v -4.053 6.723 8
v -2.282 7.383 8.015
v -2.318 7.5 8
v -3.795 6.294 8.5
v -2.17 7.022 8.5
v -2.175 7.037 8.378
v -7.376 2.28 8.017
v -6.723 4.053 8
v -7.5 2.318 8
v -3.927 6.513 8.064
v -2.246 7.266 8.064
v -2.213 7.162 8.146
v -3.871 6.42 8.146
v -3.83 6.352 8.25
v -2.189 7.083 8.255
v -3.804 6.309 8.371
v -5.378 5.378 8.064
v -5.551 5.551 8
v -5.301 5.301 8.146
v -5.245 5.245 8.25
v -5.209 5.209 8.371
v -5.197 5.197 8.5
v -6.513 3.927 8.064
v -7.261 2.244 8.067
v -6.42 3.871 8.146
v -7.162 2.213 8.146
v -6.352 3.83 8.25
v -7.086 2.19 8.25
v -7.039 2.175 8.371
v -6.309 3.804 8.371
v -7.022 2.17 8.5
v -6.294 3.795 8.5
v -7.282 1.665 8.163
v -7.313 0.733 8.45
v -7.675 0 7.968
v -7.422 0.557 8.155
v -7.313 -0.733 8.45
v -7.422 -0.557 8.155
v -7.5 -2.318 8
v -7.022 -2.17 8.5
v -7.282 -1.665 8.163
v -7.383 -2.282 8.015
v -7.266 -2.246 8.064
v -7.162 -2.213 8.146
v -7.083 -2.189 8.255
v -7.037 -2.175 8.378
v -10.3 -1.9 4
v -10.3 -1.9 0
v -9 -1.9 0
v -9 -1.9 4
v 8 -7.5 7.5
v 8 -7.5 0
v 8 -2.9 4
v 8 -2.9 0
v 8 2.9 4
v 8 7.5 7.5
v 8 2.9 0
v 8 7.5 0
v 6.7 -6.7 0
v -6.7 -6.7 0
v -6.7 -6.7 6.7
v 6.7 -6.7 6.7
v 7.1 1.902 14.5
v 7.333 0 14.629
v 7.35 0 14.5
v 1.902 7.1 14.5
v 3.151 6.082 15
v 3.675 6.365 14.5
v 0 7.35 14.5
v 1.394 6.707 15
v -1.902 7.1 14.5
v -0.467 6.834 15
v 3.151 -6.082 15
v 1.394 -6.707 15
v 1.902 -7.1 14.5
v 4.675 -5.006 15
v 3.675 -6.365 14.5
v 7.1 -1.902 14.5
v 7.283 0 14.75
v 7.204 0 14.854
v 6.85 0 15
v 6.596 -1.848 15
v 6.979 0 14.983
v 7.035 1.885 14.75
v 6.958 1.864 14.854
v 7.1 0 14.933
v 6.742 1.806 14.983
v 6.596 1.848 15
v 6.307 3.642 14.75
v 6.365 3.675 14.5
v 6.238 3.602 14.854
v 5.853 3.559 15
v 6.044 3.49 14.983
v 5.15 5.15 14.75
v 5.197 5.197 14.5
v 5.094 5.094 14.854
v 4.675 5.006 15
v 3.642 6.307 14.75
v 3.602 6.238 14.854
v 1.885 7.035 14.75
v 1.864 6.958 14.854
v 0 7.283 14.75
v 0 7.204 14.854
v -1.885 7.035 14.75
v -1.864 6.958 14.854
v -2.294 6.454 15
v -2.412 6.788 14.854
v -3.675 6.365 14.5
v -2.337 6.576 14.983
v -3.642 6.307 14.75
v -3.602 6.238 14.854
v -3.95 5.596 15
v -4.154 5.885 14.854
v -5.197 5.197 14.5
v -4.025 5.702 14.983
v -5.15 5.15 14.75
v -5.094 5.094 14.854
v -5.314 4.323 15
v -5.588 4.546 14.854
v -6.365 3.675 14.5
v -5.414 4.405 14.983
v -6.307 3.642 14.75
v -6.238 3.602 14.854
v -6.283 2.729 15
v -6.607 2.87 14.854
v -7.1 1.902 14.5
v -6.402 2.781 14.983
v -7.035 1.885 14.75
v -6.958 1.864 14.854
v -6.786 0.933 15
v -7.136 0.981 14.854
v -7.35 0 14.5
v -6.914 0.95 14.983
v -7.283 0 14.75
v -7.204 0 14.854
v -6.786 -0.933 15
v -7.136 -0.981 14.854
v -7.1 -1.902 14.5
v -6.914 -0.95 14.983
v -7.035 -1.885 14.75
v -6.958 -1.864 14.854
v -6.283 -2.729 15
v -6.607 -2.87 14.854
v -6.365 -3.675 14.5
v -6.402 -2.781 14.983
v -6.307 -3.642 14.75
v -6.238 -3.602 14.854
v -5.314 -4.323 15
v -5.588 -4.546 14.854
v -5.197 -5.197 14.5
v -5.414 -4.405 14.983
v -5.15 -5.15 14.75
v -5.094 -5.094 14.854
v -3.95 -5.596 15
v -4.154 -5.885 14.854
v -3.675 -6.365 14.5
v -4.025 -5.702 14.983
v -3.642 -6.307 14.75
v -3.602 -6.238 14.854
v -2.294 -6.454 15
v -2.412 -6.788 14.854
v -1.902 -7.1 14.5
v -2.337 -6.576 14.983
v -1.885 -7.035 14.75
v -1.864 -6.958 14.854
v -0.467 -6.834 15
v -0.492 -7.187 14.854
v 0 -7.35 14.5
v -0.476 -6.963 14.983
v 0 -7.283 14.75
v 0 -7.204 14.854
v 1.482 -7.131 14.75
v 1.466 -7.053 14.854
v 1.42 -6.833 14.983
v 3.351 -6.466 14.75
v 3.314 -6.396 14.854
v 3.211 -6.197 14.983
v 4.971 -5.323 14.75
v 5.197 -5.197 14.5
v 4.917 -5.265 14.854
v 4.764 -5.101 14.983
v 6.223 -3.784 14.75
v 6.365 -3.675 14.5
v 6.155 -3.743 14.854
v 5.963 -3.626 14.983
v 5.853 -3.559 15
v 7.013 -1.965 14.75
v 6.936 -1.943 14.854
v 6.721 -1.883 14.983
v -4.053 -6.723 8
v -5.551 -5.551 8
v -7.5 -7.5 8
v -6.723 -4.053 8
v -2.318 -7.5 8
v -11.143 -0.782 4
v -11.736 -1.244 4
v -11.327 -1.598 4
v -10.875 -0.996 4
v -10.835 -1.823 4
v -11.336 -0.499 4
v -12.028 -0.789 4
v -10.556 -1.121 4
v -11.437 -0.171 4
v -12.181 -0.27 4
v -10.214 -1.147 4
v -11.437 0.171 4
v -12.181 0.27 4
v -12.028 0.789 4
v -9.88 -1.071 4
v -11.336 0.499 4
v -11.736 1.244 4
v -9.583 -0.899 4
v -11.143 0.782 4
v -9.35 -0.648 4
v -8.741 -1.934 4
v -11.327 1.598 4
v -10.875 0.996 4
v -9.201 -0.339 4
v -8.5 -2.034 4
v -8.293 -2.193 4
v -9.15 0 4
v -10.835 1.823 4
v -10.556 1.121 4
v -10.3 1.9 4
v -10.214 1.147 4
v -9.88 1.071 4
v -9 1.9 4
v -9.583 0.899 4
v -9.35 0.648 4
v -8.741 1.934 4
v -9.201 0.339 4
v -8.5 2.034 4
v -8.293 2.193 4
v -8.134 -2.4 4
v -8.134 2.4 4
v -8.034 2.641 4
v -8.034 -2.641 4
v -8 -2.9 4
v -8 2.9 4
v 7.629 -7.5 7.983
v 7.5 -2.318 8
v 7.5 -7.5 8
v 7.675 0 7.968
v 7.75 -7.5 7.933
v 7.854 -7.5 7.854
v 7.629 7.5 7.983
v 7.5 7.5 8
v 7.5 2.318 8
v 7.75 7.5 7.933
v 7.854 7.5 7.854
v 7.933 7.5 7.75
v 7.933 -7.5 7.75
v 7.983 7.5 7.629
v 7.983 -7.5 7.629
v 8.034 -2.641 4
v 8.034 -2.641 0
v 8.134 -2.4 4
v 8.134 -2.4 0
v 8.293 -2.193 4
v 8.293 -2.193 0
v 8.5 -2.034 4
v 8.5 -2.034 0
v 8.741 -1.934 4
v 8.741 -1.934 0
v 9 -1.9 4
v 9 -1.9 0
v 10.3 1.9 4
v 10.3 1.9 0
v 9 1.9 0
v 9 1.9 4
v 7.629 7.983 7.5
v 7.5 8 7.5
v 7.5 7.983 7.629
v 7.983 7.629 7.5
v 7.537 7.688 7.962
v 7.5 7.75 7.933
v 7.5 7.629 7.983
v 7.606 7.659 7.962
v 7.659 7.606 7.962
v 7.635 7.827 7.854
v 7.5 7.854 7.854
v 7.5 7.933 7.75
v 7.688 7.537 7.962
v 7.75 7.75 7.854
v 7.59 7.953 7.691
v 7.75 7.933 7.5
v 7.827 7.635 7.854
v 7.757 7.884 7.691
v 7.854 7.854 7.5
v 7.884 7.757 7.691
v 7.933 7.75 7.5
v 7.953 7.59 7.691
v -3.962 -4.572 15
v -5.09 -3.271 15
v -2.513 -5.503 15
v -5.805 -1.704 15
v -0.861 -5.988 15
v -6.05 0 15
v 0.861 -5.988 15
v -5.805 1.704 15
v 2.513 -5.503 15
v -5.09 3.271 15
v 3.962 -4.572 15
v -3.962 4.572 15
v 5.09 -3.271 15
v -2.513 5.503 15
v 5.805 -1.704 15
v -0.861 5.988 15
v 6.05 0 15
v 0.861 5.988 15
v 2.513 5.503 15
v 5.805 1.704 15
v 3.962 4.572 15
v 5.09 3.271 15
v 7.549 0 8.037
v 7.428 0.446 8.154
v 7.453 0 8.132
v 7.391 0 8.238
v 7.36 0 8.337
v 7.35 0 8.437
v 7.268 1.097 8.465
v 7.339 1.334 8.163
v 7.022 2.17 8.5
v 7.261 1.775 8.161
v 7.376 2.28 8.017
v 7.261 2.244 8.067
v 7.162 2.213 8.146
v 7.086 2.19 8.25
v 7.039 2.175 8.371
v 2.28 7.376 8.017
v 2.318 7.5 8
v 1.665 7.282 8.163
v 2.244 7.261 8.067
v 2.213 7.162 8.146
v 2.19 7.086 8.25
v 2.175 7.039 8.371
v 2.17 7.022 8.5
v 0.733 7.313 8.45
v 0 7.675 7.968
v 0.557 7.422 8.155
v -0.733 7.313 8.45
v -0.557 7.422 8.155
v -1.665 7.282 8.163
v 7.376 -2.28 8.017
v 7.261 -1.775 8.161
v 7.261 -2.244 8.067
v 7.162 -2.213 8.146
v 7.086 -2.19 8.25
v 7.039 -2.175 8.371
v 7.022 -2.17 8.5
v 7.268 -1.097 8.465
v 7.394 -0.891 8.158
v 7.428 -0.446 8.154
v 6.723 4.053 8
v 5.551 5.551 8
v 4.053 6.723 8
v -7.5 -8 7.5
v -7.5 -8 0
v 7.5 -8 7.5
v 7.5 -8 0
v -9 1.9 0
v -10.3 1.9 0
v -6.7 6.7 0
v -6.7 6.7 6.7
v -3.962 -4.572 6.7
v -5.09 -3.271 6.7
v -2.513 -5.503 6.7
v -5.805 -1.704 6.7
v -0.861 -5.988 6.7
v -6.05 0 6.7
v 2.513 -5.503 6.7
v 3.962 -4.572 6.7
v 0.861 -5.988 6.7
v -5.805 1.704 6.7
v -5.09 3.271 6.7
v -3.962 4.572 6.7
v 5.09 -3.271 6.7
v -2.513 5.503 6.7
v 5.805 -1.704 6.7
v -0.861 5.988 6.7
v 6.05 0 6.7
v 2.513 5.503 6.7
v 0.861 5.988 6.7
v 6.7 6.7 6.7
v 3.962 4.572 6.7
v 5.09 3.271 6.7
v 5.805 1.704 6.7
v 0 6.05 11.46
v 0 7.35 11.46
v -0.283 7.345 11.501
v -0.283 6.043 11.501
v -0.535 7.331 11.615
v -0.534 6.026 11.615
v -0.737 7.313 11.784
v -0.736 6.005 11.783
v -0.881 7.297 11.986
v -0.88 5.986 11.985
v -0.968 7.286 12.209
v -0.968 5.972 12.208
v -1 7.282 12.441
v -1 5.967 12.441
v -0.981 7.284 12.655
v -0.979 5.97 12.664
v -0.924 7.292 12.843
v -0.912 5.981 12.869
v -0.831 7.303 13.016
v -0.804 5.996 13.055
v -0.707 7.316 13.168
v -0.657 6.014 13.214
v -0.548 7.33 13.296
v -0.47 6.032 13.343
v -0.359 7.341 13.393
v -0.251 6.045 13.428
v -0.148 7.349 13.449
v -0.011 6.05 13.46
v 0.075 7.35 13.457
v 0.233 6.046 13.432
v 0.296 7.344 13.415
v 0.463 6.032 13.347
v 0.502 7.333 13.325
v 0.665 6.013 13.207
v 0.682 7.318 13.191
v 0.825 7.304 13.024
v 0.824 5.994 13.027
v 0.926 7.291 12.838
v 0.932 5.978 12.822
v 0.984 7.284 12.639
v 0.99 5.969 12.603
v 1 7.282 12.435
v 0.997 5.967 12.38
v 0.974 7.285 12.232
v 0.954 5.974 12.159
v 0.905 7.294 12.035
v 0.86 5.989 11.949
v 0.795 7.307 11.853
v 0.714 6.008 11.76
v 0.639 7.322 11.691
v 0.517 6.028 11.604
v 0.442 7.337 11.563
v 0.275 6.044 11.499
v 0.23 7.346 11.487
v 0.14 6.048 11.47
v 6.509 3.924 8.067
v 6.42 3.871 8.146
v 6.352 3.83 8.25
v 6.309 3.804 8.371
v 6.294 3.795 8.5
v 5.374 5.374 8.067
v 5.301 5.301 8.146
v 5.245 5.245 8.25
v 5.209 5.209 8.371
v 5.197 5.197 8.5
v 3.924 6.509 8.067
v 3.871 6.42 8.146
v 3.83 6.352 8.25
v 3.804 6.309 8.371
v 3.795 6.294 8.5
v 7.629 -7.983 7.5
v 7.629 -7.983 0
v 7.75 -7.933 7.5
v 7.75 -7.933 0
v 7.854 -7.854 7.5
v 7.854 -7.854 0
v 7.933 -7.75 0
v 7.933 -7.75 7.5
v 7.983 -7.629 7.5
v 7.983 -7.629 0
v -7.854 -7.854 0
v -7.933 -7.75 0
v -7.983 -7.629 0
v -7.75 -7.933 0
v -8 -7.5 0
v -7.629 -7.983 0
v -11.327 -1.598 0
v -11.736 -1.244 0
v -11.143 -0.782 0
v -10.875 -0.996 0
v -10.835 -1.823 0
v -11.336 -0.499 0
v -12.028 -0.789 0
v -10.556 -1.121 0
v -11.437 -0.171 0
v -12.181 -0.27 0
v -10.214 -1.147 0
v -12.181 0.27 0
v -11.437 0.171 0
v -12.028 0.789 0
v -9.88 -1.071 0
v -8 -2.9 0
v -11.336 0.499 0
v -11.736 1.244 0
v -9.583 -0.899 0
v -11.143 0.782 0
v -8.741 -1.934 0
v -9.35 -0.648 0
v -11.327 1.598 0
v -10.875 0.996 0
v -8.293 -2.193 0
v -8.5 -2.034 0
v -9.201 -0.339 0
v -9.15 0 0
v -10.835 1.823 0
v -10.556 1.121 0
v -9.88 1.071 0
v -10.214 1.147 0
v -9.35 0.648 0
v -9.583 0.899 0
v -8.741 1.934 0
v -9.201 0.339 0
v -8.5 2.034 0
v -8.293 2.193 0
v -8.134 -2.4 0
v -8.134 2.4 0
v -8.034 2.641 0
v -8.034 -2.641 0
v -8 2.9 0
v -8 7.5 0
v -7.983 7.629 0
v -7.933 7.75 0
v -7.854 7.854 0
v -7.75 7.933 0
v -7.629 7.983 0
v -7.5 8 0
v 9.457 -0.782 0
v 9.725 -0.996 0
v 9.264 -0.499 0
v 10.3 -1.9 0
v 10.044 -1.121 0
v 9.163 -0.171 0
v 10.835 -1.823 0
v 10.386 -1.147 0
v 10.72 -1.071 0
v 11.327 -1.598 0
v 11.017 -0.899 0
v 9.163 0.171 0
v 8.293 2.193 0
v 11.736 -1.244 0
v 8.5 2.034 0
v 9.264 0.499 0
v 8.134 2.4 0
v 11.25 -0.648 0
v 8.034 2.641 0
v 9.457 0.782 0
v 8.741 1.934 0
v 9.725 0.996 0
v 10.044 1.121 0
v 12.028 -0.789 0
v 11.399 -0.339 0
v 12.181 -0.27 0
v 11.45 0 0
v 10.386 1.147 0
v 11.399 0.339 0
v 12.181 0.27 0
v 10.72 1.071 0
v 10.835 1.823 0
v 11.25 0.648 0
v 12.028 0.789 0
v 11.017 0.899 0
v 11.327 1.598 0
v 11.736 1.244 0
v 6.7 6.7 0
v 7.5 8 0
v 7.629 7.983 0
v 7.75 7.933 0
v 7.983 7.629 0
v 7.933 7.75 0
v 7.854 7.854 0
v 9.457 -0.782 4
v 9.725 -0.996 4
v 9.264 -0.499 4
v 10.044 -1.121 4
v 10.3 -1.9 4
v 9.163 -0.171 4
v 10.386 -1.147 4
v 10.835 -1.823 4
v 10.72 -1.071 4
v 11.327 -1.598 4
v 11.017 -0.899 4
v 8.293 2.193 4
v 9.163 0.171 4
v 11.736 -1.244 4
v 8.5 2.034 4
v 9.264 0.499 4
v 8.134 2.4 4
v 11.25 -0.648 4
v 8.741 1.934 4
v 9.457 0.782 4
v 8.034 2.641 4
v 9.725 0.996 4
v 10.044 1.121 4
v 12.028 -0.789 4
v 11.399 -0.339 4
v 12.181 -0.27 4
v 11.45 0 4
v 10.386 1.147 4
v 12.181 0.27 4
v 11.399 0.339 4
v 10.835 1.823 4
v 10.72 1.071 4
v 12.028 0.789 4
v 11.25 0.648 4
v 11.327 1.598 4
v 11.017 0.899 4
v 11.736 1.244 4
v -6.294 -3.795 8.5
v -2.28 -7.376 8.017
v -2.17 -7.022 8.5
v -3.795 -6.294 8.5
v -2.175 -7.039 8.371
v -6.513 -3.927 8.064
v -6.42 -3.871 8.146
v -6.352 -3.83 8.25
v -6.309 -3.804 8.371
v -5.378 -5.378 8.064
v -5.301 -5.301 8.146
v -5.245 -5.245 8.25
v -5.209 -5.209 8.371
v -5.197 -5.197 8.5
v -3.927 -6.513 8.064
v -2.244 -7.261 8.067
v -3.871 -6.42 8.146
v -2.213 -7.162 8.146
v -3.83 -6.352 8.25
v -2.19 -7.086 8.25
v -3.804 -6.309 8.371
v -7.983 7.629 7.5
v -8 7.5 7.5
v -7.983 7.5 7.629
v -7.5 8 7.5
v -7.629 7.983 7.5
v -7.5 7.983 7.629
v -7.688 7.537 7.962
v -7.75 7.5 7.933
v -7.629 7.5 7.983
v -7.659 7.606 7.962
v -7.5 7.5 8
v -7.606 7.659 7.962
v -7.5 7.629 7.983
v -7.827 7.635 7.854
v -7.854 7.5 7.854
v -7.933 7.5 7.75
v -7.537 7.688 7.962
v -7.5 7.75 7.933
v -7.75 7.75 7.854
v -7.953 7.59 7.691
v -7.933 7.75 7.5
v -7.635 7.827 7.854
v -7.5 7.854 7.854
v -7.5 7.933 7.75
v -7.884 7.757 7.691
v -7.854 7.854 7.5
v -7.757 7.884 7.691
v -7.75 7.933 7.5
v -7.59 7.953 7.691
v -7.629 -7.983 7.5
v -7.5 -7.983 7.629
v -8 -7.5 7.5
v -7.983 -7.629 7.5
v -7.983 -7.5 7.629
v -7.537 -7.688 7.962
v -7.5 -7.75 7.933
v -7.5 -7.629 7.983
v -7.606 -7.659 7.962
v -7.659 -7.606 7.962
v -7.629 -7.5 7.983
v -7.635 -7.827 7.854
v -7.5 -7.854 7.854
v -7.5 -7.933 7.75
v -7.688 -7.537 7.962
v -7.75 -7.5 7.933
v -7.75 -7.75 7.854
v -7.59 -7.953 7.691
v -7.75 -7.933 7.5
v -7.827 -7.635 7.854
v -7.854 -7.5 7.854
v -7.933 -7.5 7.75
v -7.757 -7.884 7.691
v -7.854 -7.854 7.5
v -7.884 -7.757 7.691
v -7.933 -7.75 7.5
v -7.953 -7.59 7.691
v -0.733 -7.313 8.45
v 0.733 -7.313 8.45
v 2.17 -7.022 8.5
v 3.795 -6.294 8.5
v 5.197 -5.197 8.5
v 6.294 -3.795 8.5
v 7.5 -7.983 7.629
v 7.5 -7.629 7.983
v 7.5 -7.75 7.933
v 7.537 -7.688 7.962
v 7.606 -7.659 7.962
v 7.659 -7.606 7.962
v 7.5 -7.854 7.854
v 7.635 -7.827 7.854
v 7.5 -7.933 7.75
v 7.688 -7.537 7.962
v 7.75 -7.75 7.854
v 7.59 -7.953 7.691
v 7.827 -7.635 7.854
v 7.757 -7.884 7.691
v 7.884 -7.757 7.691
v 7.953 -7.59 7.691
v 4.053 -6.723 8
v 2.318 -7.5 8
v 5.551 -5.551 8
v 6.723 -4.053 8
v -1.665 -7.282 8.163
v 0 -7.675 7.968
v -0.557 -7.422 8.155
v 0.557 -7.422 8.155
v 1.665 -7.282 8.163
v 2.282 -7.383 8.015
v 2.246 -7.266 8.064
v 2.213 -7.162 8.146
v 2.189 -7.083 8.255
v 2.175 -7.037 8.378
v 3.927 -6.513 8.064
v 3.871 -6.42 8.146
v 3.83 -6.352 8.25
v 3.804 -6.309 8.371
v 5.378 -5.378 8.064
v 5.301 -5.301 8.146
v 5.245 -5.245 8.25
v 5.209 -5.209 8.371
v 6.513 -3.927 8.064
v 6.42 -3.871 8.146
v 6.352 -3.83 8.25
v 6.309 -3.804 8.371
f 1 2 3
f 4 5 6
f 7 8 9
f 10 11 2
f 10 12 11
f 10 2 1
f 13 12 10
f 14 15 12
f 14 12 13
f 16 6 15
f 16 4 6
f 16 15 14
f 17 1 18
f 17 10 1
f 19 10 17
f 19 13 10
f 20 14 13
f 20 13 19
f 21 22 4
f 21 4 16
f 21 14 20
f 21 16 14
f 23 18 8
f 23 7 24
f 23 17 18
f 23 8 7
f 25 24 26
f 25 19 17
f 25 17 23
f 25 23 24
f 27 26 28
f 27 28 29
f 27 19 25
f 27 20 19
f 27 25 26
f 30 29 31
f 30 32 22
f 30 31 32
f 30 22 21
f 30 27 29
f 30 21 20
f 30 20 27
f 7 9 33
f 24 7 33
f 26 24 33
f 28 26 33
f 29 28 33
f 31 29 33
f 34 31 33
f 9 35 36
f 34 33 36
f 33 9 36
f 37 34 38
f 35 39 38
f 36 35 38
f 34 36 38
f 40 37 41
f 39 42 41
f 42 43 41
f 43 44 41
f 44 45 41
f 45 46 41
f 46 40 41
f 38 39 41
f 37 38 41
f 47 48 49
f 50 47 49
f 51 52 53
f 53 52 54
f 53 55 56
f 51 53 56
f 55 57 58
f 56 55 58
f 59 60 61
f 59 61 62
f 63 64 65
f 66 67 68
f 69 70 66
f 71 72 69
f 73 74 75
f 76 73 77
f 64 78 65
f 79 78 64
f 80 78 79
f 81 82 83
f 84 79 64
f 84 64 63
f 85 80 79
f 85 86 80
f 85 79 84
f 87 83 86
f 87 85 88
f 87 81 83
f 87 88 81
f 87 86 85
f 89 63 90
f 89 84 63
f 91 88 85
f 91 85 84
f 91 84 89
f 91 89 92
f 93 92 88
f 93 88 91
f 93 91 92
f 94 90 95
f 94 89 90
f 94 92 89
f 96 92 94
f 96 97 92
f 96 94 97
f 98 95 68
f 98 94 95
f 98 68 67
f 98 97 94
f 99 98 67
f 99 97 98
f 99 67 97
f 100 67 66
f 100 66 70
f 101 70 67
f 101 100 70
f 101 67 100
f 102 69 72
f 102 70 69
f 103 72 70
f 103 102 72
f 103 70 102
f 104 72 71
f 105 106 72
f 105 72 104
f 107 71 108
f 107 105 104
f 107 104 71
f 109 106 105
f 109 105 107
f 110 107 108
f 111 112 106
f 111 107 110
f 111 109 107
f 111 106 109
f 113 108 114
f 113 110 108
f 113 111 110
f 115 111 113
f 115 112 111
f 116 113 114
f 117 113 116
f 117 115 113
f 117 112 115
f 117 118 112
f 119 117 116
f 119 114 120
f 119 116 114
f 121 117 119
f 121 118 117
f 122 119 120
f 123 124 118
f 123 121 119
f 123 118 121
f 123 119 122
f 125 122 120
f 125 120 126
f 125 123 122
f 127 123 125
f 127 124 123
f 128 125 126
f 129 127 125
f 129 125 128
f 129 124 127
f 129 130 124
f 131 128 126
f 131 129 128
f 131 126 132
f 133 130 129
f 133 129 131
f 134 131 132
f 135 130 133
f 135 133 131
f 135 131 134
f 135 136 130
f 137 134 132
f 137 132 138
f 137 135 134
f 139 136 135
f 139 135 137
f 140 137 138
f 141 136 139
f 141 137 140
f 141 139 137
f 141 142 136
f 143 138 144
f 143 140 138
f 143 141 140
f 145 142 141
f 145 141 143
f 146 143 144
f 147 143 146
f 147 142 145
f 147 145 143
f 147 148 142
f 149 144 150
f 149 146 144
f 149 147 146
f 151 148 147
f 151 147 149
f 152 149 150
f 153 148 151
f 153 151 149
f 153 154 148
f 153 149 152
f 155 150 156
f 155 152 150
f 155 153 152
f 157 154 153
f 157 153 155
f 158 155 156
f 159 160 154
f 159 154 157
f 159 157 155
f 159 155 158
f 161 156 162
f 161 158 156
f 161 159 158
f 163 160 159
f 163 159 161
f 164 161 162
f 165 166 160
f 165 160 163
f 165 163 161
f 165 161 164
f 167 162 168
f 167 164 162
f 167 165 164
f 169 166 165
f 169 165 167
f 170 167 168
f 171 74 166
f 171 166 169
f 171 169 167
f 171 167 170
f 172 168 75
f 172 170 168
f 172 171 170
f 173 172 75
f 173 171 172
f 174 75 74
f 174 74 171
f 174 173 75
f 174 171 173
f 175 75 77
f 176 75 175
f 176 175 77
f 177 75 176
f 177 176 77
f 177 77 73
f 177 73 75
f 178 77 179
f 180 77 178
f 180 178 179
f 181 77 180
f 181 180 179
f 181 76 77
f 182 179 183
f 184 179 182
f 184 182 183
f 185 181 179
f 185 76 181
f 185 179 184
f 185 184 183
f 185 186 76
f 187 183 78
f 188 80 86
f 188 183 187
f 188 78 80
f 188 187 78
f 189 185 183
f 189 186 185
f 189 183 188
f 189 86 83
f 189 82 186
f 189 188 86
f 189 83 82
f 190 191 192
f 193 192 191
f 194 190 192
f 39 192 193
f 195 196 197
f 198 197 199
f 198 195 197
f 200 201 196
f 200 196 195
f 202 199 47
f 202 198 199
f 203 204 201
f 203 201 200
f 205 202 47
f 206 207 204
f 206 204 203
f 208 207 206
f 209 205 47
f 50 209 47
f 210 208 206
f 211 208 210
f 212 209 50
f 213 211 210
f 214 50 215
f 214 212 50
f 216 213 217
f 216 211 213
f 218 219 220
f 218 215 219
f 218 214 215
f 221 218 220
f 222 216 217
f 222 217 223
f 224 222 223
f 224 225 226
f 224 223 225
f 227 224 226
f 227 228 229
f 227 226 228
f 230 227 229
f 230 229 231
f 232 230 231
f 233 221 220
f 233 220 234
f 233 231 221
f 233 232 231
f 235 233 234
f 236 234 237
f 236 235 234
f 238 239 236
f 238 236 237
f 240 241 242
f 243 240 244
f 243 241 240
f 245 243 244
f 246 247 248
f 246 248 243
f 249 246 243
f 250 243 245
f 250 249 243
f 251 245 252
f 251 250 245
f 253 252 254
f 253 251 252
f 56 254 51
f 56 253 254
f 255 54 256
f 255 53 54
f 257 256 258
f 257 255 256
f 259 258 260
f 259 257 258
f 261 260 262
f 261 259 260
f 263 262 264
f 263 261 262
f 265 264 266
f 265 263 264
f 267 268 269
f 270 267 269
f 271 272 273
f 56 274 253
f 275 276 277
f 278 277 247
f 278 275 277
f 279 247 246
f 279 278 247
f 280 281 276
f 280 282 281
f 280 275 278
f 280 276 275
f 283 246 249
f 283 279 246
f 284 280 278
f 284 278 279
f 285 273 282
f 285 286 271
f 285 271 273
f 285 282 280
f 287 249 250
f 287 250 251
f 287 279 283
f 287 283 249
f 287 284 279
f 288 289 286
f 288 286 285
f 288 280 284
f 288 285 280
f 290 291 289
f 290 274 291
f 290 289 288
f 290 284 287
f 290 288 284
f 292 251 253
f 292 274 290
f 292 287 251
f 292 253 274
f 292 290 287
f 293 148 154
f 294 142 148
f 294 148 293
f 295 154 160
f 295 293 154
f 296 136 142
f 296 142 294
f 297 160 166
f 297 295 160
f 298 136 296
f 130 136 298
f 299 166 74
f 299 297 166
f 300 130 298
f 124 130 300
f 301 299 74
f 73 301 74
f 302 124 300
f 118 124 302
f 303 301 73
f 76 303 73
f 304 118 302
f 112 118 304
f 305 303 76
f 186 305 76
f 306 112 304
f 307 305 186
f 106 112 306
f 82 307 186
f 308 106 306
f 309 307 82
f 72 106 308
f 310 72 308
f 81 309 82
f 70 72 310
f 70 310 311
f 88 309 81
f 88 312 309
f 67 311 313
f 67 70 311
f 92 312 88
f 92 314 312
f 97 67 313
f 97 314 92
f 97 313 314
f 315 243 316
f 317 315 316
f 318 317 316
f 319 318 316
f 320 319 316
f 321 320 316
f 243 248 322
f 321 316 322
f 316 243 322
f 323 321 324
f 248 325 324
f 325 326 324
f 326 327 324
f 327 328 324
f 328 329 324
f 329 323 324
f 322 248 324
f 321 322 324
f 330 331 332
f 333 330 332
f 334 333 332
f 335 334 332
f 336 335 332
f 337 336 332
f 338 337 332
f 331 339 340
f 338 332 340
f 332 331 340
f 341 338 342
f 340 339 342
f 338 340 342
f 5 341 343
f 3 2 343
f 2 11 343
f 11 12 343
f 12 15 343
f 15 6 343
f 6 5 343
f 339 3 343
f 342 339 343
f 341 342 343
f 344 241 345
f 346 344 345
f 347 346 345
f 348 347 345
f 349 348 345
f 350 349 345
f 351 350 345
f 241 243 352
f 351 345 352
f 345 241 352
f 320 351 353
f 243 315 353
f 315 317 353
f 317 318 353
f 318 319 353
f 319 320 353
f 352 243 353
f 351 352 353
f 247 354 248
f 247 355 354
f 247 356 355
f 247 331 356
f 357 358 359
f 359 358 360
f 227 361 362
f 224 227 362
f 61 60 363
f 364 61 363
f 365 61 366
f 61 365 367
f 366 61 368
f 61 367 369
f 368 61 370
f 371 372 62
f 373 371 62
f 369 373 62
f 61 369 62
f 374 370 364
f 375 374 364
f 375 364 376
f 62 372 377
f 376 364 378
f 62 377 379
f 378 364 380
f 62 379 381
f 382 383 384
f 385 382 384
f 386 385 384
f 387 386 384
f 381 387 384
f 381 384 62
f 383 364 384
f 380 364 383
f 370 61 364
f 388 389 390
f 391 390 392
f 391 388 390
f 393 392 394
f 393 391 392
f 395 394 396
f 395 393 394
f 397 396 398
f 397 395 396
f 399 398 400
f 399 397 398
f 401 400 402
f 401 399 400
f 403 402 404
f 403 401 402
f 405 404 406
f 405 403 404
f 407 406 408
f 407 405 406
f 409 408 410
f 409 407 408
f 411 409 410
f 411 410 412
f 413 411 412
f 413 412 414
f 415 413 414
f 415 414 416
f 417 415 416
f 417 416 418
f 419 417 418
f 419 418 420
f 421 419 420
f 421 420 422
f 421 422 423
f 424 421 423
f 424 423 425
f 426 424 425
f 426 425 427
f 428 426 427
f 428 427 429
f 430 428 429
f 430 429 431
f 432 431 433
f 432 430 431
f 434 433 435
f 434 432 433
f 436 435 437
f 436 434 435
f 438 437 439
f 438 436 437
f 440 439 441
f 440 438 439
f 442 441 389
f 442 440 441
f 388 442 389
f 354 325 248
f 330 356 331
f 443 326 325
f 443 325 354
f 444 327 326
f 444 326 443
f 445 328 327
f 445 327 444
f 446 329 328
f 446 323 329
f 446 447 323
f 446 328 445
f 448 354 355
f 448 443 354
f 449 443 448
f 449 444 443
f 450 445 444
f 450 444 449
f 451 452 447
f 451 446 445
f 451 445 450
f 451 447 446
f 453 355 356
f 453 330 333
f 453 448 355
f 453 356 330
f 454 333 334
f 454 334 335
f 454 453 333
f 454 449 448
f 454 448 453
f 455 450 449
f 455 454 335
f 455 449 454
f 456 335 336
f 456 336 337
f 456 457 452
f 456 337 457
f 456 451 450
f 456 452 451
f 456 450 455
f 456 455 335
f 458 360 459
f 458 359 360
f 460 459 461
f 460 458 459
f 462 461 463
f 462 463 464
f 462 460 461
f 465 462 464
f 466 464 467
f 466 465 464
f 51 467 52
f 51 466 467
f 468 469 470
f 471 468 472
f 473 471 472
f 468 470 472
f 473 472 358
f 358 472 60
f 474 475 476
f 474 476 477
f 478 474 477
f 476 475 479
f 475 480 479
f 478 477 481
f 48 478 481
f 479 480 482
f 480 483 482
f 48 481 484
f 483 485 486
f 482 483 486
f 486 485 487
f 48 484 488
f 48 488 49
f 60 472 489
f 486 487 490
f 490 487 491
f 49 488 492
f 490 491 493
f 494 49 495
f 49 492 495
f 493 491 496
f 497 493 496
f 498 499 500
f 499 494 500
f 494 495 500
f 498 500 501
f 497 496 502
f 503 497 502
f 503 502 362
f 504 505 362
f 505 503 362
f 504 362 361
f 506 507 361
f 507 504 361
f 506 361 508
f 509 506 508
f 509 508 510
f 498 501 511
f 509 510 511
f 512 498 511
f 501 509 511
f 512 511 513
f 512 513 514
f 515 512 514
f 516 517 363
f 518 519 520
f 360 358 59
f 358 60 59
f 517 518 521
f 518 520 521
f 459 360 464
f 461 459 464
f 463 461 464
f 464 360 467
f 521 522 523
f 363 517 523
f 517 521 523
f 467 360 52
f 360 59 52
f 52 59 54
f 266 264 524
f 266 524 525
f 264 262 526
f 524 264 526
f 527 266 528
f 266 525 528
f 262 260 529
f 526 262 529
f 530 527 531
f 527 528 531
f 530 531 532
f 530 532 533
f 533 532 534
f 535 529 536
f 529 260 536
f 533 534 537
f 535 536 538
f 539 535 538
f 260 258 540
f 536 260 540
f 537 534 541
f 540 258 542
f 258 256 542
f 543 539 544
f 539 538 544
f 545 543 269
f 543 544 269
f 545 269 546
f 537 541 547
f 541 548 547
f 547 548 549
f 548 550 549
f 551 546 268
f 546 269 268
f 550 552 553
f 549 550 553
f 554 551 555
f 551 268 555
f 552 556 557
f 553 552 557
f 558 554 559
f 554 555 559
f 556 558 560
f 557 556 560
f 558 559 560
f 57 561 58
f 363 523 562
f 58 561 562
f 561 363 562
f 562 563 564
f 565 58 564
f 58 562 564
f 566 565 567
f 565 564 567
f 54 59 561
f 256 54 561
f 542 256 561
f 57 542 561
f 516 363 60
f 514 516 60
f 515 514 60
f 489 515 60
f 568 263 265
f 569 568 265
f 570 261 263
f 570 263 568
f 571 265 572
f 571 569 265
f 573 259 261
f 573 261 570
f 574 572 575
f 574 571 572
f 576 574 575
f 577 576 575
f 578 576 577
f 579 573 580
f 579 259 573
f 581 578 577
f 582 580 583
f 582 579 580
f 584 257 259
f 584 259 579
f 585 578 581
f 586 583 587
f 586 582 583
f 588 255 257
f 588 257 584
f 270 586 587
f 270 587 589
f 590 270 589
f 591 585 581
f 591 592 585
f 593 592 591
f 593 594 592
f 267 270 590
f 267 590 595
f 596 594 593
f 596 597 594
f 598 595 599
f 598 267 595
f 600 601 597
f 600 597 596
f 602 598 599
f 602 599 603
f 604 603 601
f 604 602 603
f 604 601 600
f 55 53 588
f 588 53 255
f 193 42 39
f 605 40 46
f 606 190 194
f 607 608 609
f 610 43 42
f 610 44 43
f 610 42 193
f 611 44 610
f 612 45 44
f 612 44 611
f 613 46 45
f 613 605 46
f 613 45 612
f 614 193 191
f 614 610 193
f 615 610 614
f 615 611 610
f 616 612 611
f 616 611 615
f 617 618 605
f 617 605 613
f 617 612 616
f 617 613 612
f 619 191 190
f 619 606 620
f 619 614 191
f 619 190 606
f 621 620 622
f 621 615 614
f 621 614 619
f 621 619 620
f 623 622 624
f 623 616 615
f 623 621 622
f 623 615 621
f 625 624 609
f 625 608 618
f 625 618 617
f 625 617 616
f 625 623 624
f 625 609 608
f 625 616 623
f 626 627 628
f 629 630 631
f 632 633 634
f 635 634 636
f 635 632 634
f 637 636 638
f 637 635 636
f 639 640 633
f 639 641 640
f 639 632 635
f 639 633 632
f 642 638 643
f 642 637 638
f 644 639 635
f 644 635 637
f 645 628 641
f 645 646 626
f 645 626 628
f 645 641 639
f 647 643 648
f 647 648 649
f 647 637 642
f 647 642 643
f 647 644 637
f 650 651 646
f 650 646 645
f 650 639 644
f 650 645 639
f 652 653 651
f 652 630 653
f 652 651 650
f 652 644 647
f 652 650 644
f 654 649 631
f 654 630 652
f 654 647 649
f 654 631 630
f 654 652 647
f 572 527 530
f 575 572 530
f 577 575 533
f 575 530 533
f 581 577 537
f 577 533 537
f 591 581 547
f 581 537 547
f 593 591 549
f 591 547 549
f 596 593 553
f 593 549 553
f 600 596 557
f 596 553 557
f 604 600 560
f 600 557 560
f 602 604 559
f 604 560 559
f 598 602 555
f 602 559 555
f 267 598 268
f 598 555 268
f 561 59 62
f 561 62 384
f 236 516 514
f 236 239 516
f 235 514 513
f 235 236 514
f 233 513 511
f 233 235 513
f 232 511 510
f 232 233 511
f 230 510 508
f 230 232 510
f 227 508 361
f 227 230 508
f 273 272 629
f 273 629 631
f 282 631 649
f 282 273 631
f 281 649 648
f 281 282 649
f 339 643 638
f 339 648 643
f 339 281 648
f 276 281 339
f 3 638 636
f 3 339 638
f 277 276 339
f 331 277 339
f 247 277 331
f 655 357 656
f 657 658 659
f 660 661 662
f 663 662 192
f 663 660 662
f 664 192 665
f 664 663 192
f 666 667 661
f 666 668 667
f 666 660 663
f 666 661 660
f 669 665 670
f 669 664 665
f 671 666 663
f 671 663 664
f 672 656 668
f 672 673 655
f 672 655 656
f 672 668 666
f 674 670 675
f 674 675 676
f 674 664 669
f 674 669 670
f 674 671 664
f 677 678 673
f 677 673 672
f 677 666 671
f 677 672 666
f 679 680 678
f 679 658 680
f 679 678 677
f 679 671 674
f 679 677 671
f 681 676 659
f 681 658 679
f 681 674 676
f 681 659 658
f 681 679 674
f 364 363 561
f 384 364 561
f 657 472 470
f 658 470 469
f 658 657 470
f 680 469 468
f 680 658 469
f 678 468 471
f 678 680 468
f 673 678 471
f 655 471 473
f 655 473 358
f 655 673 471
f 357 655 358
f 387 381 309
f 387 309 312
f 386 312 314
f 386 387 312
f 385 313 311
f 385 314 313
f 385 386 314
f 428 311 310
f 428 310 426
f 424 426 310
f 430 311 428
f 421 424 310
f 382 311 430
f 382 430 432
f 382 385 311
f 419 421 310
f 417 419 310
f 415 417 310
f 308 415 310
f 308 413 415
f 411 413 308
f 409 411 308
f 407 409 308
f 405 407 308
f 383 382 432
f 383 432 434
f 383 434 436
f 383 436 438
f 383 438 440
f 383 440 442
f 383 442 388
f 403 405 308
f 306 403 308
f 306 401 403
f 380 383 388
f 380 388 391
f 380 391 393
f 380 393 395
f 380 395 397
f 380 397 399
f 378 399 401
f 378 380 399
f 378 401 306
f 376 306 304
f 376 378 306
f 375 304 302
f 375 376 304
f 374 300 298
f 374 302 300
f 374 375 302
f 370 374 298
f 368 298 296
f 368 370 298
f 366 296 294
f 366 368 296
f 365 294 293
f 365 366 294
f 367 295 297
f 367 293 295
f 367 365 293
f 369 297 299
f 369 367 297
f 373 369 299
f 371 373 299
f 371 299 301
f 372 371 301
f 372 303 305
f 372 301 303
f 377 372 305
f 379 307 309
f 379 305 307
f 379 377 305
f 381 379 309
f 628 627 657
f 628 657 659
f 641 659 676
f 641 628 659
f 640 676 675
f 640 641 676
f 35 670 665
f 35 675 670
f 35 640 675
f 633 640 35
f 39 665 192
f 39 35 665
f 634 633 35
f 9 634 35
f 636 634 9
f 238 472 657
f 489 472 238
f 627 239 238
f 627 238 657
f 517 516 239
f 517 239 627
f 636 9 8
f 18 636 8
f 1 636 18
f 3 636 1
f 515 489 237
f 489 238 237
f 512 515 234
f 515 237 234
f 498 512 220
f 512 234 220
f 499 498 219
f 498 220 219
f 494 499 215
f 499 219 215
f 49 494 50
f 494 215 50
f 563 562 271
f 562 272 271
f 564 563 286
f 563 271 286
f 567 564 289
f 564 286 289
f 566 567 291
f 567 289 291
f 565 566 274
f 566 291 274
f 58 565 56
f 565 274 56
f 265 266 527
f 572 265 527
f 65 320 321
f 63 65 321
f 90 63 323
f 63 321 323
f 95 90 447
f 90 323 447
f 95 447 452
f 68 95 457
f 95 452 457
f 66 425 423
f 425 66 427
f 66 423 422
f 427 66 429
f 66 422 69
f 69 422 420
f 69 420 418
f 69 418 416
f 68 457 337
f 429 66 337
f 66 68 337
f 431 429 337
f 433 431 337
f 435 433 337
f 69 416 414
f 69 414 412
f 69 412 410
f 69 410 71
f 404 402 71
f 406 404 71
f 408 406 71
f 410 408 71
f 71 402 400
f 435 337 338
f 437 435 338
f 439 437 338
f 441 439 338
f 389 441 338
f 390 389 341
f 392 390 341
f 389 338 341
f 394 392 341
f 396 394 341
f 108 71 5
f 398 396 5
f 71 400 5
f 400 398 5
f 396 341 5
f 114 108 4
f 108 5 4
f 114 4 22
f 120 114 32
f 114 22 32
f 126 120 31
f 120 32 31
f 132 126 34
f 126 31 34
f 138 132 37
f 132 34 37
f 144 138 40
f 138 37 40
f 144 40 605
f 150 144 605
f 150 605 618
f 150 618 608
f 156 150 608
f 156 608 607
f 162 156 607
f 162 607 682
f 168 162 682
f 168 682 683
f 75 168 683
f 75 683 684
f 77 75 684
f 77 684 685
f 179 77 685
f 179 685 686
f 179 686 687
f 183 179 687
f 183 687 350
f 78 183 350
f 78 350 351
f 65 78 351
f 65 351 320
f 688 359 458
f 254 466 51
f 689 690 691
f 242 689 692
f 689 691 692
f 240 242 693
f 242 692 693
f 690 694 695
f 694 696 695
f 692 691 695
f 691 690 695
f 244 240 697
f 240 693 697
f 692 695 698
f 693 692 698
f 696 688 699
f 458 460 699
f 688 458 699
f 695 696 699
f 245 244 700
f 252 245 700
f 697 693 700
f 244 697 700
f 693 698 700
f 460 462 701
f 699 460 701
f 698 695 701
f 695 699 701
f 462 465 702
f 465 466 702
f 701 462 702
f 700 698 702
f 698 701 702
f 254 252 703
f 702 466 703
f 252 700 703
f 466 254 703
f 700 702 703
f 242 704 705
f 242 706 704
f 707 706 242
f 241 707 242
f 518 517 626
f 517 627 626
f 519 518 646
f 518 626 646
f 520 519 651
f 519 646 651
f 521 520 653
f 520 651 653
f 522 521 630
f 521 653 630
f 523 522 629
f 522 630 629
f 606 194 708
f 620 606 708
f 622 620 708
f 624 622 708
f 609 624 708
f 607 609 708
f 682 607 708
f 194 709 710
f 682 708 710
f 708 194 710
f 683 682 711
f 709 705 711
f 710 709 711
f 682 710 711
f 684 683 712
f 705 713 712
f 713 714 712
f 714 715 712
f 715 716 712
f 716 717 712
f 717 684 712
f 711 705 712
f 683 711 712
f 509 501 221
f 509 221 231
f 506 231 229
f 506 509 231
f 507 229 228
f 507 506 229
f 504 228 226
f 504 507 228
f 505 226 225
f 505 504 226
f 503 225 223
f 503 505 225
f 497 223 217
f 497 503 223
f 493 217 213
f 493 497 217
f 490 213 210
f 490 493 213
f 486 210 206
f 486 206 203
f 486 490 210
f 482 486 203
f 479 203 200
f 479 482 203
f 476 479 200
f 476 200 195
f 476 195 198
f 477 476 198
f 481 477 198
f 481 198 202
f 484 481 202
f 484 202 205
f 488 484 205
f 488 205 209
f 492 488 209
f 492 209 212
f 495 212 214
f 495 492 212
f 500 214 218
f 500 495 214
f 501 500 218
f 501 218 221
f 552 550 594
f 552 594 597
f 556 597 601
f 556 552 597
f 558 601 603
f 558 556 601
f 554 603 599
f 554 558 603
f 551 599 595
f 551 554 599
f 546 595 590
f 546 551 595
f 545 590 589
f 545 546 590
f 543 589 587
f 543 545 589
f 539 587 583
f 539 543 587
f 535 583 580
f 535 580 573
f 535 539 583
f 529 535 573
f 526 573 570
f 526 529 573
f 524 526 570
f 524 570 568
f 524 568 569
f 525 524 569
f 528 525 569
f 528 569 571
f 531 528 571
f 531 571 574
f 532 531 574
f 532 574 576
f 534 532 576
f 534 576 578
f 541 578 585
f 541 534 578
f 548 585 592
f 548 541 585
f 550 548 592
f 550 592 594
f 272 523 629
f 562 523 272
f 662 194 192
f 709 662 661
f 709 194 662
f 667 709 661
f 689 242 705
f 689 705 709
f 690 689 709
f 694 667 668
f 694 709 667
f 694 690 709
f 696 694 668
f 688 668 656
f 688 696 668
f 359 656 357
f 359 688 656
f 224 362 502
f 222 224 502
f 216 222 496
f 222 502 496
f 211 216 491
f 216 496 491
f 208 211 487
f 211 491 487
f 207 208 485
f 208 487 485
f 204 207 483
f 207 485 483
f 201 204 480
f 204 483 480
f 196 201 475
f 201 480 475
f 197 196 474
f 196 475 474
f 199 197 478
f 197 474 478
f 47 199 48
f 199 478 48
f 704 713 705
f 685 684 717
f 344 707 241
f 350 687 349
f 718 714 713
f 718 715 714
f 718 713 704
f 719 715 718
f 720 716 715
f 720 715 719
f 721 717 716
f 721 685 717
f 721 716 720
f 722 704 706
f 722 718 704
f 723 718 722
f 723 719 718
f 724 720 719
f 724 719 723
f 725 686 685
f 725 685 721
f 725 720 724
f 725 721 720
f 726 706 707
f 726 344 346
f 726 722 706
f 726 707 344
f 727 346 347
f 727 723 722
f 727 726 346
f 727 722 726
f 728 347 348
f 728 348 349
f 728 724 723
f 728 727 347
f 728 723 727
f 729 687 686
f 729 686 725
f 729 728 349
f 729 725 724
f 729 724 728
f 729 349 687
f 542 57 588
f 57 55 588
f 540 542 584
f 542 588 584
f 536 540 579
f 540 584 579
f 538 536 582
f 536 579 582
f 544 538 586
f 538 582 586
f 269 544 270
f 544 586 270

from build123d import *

# Parameters (mm, degrees)
SKETCH1_W          = 16
SKETCH1_H          = 16
EXTRUDE1_DEPTH     = 8
SKETCH2_R          = 7.35
EXTRUDE2_DEPTH     = 7
SHELL1_T           = -1.3
SKETCH6_R          = 1
CUT_EXTRUDE1_DEPTH = 19.788294228
SKETCH4_R          = 1.15
EXTRUDE3_DEPTH     = 4
FILLET1_R          = 0.5
FILLET2_R          = 0.5
FILLET3_R          = 1


with BuildPart() as part:
    # Sketch1 → Extrude1 (new body)
    with BuildSketch(Plane.XY):
        Rectangle(SKETCH1_W, SKETCH1_H)
    extrude(amount=EXTRUDE1_DEPTH)

    # Sketch2 → Extrude2 (add)
    with BuildSketch(Plane.XY.offset(8)):
        Circle(SKETCH2_R)
    extrude(amount=EXTRUDE2_DEPTH)

    # Shell1
    shell1_openings = [part.faces().sort_by_distance(p)[0] for p in [
        (0, 0, 15),
        (0, 0, 0),
    ]]
    offset(amount=SHELL1_T, openings=shell1_openings, kind=Kind.INTERSECTION)

    # Sketch6 → Cut-Extrude1 (cut, through all)
    with BuildSketch(Plane(origin=(0, 0, 0), x_dir=(1, 0, 0), z_dir=(0, 1, 0))):
        with Locations(Location((0, -12.46, 0), (0, 0, 90))):
            Circle(SKETCH6_R)
    extrude(amount=CUT_EXTRUDE1_DEPTH, mode=Mode.SUBTRACT)

    # Sketch4 → Extrude3 (add)
    with BuildSketch(Plane.XY):
        with BuildLine():
            Line((-8, 1.9), (-10.3, 1.9))
            ThreePointArc((-10.3, 1.9), (-12.2, 0), (-10.3, -1.9))
            Line((-10.3, -1.9), (-8, -1.9))
            Line((-8, -1.9), (-8, 1.9))
        make_face()
        with Locations((-10.3, 0)):
            Circle(SKETCH4_R, mode=Mode.SUBTRACT)
        with BuildLine():
            Line((8, 1.9), (8, -1.9))
            Line((8, -1.9), (10.3, -1.9))
            ThreePointArc((10.3, -1.9), (12.2, 0), (10.3, 1.9))
            Line((10.3, 1.9), (8, 1.9))
        make_face()
        with Locations((10.3, 0)):
            Circle(SKETCH4_R, mode=Mode.SUBTRACT)
    extrude(amount=EXTRUDE3_DEPTH)

    # Fillet1
    fillet1_edges = [part.edges().sort_by_distance(p)[0] for p in [
        (-8, 8, 4),
        (-8, -8, 4),
        (8, -8, 4),
        (8, 8, 4),
        (0, -8, 8),
        (-8, 0, 8),
        (0, 8, 8),
        (8, 0, 8),
    ]]
    fillet(fillet1_edges, radius=FILLET1_R)

    # Fillet2
    fillet2_edges = [part.edges().sort_by_distance(p)[0] for p in [
        (-7.35, 0, 8),
        (-7.35, 0, 15),
    ]]
    fillet(fillet2_edges, radius=FILLET2_R)

    # Fillet3
    fillet3_edges = [part.edges().sort_by_distance(p)[0] for p in [
        (8, 1.9, 2),
        (8, -1.9, 2),
        (-8, -1.9, 2),
        (-8, 1.9, 2),
    ]]
    fillet(fillet3_edges, radius=FILLET3_R)


solid = part.part
